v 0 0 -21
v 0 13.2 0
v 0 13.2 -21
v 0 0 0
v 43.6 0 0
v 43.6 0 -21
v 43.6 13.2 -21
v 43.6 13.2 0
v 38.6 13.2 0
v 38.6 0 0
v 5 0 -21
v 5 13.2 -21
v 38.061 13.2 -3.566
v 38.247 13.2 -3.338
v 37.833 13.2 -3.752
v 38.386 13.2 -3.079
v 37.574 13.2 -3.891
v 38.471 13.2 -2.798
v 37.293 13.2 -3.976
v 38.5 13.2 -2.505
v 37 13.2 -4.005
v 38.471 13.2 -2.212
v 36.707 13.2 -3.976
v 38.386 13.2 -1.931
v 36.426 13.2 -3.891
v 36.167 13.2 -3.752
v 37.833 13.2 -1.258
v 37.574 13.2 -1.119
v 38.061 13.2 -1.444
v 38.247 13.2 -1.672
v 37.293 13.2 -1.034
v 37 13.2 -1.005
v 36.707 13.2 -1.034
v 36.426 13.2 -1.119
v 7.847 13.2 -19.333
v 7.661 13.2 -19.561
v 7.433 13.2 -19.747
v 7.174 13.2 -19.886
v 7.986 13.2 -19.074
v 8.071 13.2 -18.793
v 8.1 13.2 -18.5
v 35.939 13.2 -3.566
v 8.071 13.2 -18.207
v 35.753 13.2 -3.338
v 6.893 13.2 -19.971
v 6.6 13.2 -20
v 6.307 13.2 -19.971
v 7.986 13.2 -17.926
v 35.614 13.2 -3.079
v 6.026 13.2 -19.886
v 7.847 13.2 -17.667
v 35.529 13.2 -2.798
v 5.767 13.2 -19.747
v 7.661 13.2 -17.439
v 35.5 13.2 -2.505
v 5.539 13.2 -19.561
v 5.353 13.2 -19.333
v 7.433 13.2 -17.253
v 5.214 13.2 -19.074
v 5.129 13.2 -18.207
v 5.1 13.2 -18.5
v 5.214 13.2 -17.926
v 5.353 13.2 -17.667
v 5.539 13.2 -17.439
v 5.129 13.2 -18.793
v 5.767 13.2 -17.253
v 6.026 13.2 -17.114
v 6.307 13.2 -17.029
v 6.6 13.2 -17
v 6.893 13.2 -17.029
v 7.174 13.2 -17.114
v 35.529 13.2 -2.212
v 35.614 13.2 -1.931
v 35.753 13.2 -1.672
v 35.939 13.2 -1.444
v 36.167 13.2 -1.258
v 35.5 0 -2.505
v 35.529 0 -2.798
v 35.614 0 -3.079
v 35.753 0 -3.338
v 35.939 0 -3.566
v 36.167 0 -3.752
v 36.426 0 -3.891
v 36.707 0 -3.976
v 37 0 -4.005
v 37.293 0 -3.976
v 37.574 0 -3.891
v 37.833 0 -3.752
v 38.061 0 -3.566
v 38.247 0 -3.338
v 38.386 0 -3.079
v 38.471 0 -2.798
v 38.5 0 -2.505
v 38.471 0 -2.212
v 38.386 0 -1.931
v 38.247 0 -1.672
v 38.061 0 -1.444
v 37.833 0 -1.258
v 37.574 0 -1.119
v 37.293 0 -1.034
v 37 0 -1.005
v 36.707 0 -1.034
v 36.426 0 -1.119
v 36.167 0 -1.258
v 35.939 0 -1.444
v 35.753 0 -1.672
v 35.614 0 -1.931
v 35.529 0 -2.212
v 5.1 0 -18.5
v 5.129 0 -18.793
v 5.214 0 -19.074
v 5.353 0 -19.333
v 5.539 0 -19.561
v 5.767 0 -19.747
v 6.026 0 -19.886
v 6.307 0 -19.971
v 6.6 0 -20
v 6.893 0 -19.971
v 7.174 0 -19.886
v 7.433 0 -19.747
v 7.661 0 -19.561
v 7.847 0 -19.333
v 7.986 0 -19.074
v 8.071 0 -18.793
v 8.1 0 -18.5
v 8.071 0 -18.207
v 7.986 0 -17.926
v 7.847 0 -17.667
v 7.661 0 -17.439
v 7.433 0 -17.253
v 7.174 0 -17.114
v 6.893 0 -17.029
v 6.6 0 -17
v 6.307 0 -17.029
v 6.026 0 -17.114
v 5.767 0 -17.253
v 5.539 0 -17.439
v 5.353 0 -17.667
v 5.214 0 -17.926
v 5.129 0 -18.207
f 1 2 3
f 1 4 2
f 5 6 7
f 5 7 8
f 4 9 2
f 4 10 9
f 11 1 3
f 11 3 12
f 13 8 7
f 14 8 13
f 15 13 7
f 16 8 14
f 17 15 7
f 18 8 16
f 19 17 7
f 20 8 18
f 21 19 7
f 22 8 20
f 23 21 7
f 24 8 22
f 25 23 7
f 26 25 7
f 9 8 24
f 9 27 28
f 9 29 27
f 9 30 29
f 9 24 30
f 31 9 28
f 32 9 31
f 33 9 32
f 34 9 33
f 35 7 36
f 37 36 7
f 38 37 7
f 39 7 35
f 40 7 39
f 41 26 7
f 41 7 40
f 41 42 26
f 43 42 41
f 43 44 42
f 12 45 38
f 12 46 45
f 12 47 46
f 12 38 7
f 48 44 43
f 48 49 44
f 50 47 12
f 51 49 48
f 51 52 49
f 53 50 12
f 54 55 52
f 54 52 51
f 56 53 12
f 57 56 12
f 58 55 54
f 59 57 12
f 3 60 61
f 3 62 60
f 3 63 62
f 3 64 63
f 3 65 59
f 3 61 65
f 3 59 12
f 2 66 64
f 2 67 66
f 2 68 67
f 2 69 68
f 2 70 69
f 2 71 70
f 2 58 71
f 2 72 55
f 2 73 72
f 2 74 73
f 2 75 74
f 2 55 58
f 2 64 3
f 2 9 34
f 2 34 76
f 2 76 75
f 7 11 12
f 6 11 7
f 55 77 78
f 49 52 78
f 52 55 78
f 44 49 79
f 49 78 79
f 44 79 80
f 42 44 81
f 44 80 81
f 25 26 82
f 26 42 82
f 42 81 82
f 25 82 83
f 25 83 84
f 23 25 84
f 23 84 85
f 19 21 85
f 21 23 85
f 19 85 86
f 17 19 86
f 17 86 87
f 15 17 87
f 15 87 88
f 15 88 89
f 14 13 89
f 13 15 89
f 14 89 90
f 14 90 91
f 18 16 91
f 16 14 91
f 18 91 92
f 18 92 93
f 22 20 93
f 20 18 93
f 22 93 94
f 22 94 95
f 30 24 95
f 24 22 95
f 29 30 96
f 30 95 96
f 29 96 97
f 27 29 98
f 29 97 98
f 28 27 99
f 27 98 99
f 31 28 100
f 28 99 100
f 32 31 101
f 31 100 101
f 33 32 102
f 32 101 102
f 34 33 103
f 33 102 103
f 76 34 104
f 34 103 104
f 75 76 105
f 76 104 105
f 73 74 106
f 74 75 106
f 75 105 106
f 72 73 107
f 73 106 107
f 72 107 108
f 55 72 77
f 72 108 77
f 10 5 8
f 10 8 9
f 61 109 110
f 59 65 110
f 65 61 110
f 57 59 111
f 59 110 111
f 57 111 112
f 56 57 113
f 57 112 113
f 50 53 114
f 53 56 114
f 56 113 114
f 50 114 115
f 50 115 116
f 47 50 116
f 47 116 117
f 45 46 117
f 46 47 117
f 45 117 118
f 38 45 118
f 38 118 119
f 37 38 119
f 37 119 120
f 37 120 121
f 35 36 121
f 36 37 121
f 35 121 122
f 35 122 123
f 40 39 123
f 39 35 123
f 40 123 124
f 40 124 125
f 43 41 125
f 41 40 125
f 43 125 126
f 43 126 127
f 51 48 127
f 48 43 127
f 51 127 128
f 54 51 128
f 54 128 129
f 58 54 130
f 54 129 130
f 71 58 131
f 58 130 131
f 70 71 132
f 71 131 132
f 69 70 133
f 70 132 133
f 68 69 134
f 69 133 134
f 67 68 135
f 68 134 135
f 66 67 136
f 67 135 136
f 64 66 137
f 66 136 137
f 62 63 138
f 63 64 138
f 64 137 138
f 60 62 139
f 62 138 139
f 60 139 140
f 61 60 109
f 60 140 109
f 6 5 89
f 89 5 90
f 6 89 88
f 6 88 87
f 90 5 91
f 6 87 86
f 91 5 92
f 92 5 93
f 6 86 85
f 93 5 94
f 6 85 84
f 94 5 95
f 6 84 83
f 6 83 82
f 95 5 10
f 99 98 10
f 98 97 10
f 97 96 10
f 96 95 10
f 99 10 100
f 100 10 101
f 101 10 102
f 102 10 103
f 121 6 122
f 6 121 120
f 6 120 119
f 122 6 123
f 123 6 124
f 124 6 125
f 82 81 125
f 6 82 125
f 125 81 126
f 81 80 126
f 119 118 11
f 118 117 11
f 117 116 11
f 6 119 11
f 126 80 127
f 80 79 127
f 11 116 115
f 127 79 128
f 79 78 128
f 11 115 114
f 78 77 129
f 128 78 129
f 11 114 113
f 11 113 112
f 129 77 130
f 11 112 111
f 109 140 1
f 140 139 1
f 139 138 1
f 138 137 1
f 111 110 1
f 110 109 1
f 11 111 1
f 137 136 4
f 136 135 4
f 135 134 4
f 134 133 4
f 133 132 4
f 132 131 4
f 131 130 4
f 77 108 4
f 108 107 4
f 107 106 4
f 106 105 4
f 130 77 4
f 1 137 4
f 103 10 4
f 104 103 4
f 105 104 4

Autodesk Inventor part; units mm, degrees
ref_plane "YZ Plane" through (0, 0, 0) normal (1, 0, 0) x (0, 1, 0)
ref_plane "XZ Plane" through (0, 0, 0) normal (0, 1, 0) x (-1, 0, 0)
ref_plane "XY Plane" through (0, 0, 0) normal (0, 0, 1) x (1, 0, 0)
sketch "Sketch1" plane through (0, 0, 0) normal (0, 1, 0) x (-1, 0, 0)
  line L0 (0, 0) -> (0, -21)
  line L1 (0, -21) -> (-43.6, -21)
  line L2 (-43.6, -21) -> (-43.6, 0)
  line L3 (-43.6, 0) -> (0, 0)
  line L4 (-43.6, 0) -> (-38.6, 0)
  circle A0 centre (-37, -2.5049) radius 1.5
  line L5 (0, -21) -> (-5, -21)
  circle A1 centre (-6.6, -18.5) radius 1.5
  dimension "d0" = 21
  dimension "d1" = 43.6
  dimension "d5" = 3
  dimension "d9" = 3
extrude "Extrusion1" add sketch "Sketch1" along normal blind 13.2
properties part number "boost_converter"
